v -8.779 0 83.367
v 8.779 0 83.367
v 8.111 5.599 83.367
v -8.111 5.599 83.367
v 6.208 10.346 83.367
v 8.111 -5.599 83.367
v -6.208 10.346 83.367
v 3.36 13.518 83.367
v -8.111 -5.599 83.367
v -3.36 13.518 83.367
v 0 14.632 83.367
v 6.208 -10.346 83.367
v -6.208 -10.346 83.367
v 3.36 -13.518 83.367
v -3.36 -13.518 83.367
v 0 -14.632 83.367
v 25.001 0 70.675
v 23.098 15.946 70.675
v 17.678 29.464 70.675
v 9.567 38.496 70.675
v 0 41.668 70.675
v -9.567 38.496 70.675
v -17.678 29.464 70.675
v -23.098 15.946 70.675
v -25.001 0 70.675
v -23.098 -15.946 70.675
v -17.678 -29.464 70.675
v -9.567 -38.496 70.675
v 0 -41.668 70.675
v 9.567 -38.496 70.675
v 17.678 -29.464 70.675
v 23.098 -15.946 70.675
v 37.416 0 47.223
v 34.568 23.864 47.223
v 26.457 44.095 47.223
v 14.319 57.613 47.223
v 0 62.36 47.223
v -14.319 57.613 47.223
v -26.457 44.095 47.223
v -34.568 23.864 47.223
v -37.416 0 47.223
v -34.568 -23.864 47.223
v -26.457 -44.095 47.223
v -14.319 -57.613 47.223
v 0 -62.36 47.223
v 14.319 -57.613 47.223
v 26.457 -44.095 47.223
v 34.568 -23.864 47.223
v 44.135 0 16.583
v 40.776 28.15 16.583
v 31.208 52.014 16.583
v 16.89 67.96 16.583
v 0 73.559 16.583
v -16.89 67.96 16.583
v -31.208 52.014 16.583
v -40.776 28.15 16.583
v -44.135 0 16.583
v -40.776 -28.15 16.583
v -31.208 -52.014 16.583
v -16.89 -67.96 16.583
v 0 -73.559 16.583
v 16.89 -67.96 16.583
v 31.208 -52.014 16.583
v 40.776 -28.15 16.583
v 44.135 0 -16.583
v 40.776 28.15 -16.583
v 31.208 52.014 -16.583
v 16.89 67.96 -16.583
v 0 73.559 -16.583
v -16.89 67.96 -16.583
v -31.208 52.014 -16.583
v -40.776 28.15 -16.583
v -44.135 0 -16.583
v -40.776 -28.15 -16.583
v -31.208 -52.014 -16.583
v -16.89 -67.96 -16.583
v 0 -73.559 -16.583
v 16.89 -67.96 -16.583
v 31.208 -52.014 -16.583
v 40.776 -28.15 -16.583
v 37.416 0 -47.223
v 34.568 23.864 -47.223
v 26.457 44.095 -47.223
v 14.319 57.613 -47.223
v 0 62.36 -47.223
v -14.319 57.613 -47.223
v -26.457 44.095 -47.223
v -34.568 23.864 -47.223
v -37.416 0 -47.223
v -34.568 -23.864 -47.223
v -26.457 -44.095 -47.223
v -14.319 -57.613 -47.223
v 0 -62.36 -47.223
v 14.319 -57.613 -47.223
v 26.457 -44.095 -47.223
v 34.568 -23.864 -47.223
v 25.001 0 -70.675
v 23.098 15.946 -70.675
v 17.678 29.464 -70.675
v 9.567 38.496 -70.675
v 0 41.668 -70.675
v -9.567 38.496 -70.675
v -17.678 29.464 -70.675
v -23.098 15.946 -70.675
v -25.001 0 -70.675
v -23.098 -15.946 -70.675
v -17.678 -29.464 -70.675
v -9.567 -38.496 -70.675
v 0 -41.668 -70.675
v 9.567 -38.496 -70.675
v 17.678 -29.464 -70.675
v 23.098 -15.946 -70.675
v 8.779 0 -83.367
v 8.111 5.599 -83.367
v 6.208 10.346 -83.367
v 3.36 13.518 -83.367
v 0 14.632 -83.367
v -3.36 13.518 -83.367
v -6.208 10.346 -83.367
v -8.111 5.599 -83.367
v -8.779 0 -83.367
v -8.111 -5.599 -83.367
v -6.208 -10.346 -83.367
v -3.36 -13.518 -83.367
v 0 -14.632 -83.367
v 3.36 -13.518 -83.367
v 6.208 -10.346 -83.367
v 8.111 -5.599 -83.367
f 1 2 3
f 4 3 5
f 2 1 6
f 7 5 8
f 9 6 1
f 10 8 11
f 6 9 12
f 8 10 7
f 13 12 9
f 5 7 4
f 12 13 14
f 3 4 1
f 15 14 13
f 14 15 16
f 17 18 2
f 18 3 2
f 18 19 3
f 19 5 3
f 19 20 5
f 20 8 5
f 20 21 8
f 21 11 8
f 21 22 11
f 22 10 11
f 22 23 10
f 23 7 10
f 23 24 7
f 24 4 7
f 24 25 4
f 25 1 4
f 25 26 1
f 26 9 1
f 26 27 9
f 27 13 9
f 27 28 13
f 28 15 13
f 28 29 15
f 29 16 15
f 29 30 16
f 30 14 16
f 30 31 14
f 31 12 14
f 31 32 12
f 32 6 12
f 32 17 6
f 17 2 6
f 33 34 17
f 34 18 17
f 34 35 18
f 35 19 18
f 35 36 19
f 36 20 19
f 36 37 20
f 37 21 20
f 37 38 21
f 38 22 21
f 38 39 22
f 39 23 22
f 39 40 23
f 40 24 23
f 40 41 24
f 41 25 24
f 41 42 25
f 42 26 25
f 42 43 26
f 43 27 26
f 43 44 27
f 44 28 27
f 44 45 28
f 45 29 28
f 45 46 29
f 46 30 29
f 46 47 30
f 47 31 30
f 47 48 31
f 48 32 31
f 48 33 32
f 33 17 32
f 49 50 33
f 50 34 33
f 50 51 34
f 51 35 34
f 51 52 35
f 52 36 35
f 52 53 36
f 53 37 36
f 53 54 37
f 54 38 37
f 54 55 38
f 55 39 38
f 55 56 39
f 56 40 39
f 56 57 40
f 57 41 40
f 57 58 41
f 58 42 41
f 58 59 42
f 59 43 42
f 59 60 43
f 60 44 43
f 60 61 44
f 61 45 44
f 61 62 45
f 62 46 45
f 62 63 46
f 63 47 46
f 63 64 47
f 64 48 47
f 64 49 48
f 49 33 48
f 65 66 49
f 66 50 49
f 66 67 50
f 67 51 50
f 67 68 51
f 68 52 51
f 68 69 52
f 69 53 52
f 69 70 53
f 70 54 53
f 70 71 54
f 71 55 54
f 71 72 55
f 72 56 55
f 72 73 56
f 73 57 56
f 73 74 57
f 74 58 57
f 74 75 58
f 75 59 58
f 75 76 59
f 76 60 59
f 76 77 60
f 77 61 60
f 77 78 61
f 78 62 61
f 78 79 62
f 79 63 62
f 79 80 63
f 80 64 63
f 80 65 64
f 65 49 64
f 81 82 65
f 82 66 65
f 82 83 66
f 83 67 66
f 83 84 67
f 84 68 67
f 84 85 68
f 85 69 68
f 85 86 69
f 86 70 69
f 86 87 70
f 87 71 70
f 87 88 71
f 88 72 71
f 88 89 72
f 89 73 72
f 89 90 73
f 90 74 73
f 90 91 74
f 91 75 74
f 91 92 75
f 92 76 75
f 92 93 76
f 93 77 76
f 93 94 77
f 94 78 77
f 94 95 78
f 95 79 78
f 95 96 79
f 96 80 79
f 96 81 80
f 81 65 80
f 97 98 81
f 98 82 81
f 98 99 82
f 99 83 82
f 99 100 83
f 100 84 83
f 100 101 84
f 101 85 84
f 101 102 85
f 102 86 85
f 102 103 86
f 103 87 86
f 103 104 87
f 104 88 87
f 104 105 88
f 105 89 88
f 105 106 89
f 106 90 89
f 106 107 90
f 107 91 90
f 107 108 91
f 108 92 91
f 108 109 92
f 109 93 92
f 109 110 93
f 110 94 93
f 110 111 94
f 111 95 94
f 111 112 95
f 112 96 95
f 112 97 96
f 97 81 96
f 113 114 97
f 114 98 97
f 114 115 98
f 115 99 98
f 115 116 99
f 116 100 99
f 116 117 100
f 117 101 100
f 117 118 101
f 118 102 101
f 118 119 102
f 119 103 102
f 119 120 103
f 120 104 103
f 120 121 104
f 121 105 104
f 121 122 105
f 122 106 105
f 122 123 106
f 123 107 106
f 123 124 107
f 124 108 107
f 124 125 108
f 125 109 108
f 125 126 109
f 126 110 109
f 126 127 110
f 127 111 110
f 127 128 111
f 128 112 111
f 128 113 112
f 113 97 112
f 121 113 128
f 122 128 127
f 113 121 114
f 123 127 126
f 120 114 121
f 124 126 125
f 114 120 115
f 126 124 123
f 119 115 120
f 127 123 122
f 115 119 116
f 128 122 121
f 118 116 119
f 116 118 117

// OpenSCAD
// Generated by SolidPython 1.0.1 on 2020-07-29 00:46:49


scale(v = [9, 15, 17]) {
	sphere(r = 5);
}
/***********************************************
*********      SolidPython code:      **********
************************************************
 
# import packages: SolidPython
from solid import *
from solid.utils import *
from itertools import chain, combinations, permutations


class Resize:

    def __init__(self, scad_file):
        self.scad_file = scad_file
        #self.scad_file = import_scad(scad_file)
        # cone/cylinder param:
        self.r1 = 0
        self.r2 = 0
        self.h = 0
        # rectangular prism param:
        self.w = 0
        self.l = 0
        # ellipse param:
        self.r = 0

    # import OpenScad code (file name corresponds to shape)


    # classify shape + parameters
    def assign(self, param1, param2, param3):
        if self.scad_file == 'cone.scad':
            self.r1 = param1
            self.r2 = param2
            self.h = param3
        elif self.scad_file == 'cylinder.scad':
            self.r1 = param1
            self.r2 = param2
            self.h = param3
        elif self.scad_file == 'rectangularPrism.scad':
            self.h = param1
            self.l = param2
            self.w = param3
        else:
            self.r = param1
            self.h = param2

    # resize parameters
    def iterate(self):
        x = range(3, 20, 2)
        i = 1
        if self.scad_file == 'cone.scad':
            tempList = list(permutations(x, 2))
            for temp in tempList:
                param1 = temp[0]
                param2 = temp[1]
                filepath = 'produced_scad_files/' + 'cone' + str(param1) + '_' + str(param2) + '_' + '.scad'
                scad_render_to_file(cylinder(h=param1, r1=param2, r2=0), filepath)

        elif self.scad_file == 'cylinder.scad':
            tempList = list(permutations(x, 3))
            for temp in tempList:
                param1 = temp[0]
                param2 = temp[1]
                filepath = 'produced_scad_files/' + 'cylinder' + str(param1) + '_' + str(param2) + '_' + '.scad'
                scad_render_to_file(cylinder(h=param1, r1=param2, r2=param2), filepath)

        elif self.scad_file == 'rectangularPrism.scad':
            tempList = list(permutations(x, 3))
            for temp in tempList:
                param1 = temp[0]
                param2 = temp[1]
                param3 = temp[2]
                filepath = 'produced_scad_files/' + 'rectangularPrism' + str(param1) + '_' + str(param2) + '_' + str(
                    param3) + '.scad'
                scad_render_to_file(cube(size=(param1, param2, param3)), filepath)

        elif self.scad_file == 'ellipse.scad':
            tempList = list(permutations(x, 4))
            for temp in tempList:
                param1 = temp[0]
                param2 = temp[1]
                param3 = temp[2]
                param4 = temp[3]
                filepath = 'produced_scad_files/' + 'ellipse' + str(param1) + '_' + str(param2) + '_' + str(param3) + '_' + str(param4) + '.scad'
                scad_render_to_file(scale([param1, param2, param3])(sphere(r=param4)), filepath)

    def render_to_scadfile(self):
        scad_render_to_file(scad, 'example.scad') 
 
************************************************/
